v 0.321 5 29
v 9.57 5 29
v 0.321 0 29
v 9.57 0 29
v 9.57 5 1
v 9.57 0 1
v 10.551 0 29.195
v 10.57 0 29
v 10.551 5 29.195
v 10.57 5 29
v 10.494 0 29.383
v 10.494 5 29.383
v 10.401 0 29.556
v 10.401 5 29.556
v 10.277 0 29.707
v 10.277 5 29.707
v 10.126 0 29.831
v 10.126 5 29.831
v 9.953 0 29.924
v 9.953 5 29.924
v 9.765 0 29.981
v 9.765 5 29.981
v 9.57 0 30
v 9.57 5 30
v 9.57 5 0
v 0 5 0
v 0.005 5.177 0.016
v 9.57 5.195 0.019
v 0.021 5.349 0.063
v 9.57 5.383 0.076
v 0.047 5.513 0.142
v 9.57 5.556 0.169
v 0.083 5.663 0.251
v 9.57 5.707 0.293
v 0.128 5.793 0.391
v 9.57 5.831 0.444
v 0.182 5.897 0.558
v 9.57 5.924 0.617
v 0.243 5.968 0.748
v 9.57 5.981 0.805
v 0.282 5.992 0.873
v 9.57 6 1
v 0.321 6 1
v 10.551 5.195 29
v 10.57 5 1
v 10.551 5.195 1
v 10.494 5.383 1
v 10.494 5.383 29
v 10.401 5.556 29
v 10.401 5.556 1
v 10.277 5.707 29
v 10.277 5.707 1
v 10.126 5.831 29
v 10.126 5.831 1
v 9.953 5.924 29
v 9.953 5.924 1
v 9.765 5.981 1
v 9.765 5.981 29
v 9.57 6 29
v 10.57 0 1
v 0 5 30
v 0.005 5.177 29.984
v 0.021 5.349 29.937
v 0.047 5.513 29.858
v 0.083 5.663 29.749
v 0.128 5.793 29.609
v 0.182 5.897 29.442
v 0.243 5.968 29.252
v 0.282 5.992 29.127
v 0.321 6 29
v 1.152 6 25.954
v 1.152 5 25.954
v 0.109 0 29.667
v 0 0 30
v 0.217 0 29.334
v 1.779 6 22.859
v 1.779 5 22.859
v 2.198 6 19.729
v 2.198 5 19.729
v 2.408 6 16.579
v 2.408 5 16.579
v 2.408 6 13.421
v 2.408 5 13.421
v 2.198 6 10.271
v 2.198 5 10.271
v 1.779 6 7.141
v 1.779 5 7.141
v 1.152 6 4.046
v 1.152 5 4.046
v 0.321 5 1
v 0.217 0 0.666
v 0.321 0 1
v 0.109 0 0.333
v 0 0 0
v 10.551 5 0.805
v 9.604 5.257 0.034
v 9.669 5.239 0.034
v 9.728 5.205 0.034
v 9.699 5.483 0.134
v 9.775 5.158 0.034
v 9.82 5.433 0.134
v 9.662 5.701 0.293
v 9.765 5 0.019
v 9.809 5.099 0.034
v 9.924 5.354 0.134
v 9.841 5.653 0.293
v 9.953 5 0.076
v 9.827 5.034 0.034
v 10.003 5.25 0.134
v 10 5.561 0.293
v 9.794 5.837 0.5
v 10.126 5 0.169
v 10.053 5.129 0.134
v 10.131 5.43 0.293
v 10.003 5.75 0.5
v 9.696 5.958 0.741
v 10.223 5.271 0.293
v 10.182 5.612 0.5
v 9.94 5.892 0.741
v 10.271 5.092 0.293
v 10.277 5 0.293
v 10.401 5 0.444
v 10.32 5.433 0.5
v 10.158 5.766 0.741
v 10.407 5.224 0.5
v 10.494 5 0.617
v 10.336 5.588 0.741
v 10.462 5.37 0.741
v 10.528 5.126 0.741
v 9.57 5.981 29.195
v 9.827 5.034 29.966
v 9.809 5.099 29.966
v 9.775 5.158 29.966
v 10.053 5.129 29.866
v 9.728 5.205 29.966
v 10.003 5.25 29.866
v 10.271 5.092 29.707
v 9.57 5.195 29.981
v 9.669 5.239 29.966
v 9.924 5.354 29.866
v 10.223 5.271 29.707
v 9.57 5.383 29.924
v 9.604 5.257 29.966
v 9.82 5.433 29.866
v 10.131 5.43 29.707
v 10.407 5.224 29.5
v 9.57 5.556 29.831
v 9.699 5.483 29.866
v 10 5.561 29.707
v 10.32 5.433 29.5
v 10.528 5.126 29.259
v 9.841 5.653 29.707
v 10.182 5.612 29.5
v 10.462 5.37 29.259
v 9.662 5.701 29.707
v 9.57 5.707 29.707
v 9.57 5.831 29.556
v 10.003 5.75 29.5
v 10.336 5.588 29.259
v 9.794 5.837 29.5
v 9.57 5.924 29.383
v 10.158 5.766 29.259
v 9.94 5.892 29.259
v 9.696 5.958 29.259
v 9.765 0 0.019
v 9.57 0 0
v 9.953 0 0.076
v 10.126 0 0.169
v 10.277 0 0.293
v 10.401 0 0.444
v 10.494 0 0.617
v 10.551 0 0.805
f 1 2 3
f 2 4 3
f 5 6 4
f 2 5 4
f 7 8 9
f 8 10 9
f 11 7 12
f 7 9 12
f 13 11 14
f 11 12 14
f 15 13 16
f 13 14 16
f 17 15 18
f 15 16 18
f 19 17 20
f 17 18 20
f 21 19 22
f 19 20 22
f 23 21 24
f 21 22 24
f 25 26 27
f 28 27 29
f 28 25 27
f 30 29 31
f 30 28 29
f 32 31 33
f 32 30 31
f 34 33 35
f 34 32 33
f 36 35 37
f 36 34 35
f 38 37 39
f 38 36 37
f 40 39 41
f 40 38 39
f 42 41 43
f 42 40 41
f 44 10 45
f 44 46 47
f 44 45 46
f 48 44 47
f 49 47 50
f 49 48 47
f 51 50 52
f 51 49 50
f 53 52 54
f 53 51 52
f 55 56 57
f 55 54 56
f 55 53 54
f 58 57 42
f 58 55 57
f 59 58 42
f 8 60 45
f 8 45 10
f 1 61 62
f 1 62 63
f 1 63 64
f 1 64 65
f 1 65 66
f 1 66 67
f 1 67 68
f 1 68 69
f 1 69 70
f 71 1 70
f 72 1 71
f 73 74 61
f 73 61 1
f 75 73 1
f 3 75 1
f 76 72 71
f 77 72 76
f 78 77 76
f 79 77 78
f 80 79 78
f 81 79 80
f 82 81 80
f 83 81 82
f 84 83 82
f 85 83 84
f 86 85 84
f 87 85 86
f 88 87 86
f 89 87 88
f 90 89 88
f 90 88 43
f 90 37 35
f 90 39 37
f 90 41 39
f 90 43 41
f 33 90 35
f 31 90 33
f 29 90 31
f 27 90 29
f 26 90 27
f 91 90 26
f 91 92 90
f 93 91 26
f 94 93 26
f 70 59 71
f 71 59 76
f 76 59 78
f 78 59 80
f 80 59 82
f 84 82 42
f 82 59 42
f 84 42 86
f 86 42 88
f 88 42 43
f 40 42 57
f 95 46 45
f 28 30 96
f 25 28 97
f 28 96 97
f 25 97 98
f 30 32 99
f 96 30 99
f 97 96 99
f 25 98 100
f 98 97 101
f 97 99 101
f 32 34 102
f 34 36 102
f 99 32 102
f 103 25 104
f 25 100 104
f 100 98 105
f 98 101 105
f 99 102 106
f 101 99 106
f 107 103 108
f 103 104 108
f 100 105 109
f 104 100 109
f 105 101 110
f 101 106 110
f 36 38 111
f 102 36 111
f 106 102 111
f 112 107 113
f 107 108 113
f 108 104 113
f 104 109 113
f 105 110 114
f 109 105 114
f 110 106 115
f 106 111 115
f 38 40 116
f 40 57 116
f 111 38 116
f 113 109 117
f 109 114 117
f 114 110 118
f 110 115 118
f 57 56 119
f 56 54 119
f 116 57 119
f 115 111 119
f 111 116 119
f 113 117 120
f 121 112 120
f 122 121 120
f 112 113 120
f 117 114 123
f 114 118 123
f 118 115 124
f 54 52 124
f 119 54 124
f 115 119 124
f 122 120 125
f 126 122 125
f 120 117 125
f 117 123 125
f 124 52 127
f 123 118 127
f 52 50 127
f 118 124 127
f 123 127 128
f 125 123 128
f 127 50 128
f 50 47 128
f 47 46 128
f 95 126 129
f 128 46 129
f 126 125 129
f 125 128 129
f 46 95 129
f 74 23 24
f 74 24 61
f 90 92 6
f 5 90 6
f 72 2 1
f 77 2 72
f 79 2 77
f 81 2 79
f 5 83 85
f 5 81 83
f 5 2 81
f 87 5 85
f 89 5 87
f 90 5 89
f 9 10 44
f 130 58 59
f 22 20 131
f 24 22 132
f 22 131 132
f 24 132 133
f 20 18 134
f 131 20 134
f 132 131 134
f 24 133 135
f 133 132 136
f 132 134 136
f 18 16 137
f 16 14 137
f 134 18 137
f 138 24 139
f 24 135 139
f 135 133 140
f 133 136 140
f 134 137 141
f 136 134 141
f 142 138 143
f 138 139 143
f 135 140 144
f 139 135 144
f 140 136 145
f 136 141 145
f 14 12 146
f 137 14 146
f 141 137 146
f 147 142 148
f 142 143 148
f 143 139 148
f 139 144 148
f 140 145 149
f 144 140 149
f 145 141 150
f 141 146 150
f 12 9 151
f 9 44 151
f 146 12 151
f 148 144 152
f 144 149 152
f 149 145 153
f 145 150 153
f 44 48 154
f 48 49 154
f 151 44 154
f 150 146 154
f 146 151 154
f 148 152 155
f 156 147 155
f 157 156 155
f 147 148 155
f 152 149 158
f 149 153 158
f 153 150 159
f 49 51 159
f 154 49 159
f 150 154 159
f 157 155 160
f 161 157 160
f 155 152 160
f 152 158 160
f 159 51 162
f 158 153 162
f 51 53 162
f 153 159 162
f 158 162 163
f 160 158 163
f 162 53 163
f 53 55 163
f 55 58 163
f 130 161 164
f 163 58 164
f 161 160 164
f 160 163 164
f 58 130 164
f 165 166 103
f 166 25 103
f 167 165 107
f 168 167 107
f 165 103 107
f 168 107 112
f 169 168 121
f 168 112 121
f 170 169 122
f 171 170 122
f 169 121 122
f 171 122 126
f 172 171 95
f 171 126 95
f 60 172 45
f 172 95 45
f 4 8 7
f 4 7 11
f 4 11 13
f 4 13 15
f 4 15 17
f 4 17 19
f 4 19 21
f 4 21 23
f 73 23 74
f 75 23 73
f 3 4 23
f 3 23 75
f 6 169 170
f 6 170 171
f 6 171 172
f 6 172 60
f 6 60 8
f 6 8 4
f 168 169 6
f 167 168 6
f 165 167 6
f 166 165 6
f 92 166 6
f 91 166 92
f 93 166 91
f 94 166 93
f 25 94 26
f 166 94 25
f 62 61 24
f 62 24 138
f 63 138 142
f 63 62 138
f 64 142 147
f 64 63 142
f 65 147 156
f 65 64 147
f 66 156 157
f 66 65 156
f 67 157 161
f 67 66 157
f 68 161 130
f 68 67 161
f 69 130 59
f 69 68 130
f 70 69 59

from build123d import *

# Parameters (mm, degrees)
BOSS_EXTRUDE1_DEPTH = 6
SHELL1_T            = -1
FILLET1_R           = 1


with BuildPart() as part:
    # Sketch1 → Boss-Extrude1 (new body)
    with BuildSketch(Plane(origin=(0, 0, 0), x_dir=(1, 0, 0), z_dir=(0, 1, 0))):
        with BuildLine():
            Line((0, 0), (10.57, 0))
            Line((10.57, 0), (10.57, -30))
            Line((10.57, -30), (0, -30))
            ThreePointArc((0, -30), (2.434164903, -15), (0, 0))
        make_face()
    extrude(amount=BOSS_EXTRUDE1_DEPTH)

    # Shell1
    shell1_openings = [part.faces().sort_by_distance(p)[0] for p in [
        (6.071410828, 0, 15),
        (2.434164903, 3, 15),
    ]]
    offset(amount=SHELL1_T, openings=shell1_openings, kind=Kind.INTERSECTION)

    # Fillet1
    fillet1_edges = [part.edges().sort_by_distance(p)[0] for p in [
        (10.57, 6, 15),
        (5.285, 6, 0),
        (10.57, 3, 0),
        (10.57, 3, 30),
        (5.285, 6, 30),
    ]]
    fillet(fillet1_edges, radius=FILLET1_R)


solid = part.part
